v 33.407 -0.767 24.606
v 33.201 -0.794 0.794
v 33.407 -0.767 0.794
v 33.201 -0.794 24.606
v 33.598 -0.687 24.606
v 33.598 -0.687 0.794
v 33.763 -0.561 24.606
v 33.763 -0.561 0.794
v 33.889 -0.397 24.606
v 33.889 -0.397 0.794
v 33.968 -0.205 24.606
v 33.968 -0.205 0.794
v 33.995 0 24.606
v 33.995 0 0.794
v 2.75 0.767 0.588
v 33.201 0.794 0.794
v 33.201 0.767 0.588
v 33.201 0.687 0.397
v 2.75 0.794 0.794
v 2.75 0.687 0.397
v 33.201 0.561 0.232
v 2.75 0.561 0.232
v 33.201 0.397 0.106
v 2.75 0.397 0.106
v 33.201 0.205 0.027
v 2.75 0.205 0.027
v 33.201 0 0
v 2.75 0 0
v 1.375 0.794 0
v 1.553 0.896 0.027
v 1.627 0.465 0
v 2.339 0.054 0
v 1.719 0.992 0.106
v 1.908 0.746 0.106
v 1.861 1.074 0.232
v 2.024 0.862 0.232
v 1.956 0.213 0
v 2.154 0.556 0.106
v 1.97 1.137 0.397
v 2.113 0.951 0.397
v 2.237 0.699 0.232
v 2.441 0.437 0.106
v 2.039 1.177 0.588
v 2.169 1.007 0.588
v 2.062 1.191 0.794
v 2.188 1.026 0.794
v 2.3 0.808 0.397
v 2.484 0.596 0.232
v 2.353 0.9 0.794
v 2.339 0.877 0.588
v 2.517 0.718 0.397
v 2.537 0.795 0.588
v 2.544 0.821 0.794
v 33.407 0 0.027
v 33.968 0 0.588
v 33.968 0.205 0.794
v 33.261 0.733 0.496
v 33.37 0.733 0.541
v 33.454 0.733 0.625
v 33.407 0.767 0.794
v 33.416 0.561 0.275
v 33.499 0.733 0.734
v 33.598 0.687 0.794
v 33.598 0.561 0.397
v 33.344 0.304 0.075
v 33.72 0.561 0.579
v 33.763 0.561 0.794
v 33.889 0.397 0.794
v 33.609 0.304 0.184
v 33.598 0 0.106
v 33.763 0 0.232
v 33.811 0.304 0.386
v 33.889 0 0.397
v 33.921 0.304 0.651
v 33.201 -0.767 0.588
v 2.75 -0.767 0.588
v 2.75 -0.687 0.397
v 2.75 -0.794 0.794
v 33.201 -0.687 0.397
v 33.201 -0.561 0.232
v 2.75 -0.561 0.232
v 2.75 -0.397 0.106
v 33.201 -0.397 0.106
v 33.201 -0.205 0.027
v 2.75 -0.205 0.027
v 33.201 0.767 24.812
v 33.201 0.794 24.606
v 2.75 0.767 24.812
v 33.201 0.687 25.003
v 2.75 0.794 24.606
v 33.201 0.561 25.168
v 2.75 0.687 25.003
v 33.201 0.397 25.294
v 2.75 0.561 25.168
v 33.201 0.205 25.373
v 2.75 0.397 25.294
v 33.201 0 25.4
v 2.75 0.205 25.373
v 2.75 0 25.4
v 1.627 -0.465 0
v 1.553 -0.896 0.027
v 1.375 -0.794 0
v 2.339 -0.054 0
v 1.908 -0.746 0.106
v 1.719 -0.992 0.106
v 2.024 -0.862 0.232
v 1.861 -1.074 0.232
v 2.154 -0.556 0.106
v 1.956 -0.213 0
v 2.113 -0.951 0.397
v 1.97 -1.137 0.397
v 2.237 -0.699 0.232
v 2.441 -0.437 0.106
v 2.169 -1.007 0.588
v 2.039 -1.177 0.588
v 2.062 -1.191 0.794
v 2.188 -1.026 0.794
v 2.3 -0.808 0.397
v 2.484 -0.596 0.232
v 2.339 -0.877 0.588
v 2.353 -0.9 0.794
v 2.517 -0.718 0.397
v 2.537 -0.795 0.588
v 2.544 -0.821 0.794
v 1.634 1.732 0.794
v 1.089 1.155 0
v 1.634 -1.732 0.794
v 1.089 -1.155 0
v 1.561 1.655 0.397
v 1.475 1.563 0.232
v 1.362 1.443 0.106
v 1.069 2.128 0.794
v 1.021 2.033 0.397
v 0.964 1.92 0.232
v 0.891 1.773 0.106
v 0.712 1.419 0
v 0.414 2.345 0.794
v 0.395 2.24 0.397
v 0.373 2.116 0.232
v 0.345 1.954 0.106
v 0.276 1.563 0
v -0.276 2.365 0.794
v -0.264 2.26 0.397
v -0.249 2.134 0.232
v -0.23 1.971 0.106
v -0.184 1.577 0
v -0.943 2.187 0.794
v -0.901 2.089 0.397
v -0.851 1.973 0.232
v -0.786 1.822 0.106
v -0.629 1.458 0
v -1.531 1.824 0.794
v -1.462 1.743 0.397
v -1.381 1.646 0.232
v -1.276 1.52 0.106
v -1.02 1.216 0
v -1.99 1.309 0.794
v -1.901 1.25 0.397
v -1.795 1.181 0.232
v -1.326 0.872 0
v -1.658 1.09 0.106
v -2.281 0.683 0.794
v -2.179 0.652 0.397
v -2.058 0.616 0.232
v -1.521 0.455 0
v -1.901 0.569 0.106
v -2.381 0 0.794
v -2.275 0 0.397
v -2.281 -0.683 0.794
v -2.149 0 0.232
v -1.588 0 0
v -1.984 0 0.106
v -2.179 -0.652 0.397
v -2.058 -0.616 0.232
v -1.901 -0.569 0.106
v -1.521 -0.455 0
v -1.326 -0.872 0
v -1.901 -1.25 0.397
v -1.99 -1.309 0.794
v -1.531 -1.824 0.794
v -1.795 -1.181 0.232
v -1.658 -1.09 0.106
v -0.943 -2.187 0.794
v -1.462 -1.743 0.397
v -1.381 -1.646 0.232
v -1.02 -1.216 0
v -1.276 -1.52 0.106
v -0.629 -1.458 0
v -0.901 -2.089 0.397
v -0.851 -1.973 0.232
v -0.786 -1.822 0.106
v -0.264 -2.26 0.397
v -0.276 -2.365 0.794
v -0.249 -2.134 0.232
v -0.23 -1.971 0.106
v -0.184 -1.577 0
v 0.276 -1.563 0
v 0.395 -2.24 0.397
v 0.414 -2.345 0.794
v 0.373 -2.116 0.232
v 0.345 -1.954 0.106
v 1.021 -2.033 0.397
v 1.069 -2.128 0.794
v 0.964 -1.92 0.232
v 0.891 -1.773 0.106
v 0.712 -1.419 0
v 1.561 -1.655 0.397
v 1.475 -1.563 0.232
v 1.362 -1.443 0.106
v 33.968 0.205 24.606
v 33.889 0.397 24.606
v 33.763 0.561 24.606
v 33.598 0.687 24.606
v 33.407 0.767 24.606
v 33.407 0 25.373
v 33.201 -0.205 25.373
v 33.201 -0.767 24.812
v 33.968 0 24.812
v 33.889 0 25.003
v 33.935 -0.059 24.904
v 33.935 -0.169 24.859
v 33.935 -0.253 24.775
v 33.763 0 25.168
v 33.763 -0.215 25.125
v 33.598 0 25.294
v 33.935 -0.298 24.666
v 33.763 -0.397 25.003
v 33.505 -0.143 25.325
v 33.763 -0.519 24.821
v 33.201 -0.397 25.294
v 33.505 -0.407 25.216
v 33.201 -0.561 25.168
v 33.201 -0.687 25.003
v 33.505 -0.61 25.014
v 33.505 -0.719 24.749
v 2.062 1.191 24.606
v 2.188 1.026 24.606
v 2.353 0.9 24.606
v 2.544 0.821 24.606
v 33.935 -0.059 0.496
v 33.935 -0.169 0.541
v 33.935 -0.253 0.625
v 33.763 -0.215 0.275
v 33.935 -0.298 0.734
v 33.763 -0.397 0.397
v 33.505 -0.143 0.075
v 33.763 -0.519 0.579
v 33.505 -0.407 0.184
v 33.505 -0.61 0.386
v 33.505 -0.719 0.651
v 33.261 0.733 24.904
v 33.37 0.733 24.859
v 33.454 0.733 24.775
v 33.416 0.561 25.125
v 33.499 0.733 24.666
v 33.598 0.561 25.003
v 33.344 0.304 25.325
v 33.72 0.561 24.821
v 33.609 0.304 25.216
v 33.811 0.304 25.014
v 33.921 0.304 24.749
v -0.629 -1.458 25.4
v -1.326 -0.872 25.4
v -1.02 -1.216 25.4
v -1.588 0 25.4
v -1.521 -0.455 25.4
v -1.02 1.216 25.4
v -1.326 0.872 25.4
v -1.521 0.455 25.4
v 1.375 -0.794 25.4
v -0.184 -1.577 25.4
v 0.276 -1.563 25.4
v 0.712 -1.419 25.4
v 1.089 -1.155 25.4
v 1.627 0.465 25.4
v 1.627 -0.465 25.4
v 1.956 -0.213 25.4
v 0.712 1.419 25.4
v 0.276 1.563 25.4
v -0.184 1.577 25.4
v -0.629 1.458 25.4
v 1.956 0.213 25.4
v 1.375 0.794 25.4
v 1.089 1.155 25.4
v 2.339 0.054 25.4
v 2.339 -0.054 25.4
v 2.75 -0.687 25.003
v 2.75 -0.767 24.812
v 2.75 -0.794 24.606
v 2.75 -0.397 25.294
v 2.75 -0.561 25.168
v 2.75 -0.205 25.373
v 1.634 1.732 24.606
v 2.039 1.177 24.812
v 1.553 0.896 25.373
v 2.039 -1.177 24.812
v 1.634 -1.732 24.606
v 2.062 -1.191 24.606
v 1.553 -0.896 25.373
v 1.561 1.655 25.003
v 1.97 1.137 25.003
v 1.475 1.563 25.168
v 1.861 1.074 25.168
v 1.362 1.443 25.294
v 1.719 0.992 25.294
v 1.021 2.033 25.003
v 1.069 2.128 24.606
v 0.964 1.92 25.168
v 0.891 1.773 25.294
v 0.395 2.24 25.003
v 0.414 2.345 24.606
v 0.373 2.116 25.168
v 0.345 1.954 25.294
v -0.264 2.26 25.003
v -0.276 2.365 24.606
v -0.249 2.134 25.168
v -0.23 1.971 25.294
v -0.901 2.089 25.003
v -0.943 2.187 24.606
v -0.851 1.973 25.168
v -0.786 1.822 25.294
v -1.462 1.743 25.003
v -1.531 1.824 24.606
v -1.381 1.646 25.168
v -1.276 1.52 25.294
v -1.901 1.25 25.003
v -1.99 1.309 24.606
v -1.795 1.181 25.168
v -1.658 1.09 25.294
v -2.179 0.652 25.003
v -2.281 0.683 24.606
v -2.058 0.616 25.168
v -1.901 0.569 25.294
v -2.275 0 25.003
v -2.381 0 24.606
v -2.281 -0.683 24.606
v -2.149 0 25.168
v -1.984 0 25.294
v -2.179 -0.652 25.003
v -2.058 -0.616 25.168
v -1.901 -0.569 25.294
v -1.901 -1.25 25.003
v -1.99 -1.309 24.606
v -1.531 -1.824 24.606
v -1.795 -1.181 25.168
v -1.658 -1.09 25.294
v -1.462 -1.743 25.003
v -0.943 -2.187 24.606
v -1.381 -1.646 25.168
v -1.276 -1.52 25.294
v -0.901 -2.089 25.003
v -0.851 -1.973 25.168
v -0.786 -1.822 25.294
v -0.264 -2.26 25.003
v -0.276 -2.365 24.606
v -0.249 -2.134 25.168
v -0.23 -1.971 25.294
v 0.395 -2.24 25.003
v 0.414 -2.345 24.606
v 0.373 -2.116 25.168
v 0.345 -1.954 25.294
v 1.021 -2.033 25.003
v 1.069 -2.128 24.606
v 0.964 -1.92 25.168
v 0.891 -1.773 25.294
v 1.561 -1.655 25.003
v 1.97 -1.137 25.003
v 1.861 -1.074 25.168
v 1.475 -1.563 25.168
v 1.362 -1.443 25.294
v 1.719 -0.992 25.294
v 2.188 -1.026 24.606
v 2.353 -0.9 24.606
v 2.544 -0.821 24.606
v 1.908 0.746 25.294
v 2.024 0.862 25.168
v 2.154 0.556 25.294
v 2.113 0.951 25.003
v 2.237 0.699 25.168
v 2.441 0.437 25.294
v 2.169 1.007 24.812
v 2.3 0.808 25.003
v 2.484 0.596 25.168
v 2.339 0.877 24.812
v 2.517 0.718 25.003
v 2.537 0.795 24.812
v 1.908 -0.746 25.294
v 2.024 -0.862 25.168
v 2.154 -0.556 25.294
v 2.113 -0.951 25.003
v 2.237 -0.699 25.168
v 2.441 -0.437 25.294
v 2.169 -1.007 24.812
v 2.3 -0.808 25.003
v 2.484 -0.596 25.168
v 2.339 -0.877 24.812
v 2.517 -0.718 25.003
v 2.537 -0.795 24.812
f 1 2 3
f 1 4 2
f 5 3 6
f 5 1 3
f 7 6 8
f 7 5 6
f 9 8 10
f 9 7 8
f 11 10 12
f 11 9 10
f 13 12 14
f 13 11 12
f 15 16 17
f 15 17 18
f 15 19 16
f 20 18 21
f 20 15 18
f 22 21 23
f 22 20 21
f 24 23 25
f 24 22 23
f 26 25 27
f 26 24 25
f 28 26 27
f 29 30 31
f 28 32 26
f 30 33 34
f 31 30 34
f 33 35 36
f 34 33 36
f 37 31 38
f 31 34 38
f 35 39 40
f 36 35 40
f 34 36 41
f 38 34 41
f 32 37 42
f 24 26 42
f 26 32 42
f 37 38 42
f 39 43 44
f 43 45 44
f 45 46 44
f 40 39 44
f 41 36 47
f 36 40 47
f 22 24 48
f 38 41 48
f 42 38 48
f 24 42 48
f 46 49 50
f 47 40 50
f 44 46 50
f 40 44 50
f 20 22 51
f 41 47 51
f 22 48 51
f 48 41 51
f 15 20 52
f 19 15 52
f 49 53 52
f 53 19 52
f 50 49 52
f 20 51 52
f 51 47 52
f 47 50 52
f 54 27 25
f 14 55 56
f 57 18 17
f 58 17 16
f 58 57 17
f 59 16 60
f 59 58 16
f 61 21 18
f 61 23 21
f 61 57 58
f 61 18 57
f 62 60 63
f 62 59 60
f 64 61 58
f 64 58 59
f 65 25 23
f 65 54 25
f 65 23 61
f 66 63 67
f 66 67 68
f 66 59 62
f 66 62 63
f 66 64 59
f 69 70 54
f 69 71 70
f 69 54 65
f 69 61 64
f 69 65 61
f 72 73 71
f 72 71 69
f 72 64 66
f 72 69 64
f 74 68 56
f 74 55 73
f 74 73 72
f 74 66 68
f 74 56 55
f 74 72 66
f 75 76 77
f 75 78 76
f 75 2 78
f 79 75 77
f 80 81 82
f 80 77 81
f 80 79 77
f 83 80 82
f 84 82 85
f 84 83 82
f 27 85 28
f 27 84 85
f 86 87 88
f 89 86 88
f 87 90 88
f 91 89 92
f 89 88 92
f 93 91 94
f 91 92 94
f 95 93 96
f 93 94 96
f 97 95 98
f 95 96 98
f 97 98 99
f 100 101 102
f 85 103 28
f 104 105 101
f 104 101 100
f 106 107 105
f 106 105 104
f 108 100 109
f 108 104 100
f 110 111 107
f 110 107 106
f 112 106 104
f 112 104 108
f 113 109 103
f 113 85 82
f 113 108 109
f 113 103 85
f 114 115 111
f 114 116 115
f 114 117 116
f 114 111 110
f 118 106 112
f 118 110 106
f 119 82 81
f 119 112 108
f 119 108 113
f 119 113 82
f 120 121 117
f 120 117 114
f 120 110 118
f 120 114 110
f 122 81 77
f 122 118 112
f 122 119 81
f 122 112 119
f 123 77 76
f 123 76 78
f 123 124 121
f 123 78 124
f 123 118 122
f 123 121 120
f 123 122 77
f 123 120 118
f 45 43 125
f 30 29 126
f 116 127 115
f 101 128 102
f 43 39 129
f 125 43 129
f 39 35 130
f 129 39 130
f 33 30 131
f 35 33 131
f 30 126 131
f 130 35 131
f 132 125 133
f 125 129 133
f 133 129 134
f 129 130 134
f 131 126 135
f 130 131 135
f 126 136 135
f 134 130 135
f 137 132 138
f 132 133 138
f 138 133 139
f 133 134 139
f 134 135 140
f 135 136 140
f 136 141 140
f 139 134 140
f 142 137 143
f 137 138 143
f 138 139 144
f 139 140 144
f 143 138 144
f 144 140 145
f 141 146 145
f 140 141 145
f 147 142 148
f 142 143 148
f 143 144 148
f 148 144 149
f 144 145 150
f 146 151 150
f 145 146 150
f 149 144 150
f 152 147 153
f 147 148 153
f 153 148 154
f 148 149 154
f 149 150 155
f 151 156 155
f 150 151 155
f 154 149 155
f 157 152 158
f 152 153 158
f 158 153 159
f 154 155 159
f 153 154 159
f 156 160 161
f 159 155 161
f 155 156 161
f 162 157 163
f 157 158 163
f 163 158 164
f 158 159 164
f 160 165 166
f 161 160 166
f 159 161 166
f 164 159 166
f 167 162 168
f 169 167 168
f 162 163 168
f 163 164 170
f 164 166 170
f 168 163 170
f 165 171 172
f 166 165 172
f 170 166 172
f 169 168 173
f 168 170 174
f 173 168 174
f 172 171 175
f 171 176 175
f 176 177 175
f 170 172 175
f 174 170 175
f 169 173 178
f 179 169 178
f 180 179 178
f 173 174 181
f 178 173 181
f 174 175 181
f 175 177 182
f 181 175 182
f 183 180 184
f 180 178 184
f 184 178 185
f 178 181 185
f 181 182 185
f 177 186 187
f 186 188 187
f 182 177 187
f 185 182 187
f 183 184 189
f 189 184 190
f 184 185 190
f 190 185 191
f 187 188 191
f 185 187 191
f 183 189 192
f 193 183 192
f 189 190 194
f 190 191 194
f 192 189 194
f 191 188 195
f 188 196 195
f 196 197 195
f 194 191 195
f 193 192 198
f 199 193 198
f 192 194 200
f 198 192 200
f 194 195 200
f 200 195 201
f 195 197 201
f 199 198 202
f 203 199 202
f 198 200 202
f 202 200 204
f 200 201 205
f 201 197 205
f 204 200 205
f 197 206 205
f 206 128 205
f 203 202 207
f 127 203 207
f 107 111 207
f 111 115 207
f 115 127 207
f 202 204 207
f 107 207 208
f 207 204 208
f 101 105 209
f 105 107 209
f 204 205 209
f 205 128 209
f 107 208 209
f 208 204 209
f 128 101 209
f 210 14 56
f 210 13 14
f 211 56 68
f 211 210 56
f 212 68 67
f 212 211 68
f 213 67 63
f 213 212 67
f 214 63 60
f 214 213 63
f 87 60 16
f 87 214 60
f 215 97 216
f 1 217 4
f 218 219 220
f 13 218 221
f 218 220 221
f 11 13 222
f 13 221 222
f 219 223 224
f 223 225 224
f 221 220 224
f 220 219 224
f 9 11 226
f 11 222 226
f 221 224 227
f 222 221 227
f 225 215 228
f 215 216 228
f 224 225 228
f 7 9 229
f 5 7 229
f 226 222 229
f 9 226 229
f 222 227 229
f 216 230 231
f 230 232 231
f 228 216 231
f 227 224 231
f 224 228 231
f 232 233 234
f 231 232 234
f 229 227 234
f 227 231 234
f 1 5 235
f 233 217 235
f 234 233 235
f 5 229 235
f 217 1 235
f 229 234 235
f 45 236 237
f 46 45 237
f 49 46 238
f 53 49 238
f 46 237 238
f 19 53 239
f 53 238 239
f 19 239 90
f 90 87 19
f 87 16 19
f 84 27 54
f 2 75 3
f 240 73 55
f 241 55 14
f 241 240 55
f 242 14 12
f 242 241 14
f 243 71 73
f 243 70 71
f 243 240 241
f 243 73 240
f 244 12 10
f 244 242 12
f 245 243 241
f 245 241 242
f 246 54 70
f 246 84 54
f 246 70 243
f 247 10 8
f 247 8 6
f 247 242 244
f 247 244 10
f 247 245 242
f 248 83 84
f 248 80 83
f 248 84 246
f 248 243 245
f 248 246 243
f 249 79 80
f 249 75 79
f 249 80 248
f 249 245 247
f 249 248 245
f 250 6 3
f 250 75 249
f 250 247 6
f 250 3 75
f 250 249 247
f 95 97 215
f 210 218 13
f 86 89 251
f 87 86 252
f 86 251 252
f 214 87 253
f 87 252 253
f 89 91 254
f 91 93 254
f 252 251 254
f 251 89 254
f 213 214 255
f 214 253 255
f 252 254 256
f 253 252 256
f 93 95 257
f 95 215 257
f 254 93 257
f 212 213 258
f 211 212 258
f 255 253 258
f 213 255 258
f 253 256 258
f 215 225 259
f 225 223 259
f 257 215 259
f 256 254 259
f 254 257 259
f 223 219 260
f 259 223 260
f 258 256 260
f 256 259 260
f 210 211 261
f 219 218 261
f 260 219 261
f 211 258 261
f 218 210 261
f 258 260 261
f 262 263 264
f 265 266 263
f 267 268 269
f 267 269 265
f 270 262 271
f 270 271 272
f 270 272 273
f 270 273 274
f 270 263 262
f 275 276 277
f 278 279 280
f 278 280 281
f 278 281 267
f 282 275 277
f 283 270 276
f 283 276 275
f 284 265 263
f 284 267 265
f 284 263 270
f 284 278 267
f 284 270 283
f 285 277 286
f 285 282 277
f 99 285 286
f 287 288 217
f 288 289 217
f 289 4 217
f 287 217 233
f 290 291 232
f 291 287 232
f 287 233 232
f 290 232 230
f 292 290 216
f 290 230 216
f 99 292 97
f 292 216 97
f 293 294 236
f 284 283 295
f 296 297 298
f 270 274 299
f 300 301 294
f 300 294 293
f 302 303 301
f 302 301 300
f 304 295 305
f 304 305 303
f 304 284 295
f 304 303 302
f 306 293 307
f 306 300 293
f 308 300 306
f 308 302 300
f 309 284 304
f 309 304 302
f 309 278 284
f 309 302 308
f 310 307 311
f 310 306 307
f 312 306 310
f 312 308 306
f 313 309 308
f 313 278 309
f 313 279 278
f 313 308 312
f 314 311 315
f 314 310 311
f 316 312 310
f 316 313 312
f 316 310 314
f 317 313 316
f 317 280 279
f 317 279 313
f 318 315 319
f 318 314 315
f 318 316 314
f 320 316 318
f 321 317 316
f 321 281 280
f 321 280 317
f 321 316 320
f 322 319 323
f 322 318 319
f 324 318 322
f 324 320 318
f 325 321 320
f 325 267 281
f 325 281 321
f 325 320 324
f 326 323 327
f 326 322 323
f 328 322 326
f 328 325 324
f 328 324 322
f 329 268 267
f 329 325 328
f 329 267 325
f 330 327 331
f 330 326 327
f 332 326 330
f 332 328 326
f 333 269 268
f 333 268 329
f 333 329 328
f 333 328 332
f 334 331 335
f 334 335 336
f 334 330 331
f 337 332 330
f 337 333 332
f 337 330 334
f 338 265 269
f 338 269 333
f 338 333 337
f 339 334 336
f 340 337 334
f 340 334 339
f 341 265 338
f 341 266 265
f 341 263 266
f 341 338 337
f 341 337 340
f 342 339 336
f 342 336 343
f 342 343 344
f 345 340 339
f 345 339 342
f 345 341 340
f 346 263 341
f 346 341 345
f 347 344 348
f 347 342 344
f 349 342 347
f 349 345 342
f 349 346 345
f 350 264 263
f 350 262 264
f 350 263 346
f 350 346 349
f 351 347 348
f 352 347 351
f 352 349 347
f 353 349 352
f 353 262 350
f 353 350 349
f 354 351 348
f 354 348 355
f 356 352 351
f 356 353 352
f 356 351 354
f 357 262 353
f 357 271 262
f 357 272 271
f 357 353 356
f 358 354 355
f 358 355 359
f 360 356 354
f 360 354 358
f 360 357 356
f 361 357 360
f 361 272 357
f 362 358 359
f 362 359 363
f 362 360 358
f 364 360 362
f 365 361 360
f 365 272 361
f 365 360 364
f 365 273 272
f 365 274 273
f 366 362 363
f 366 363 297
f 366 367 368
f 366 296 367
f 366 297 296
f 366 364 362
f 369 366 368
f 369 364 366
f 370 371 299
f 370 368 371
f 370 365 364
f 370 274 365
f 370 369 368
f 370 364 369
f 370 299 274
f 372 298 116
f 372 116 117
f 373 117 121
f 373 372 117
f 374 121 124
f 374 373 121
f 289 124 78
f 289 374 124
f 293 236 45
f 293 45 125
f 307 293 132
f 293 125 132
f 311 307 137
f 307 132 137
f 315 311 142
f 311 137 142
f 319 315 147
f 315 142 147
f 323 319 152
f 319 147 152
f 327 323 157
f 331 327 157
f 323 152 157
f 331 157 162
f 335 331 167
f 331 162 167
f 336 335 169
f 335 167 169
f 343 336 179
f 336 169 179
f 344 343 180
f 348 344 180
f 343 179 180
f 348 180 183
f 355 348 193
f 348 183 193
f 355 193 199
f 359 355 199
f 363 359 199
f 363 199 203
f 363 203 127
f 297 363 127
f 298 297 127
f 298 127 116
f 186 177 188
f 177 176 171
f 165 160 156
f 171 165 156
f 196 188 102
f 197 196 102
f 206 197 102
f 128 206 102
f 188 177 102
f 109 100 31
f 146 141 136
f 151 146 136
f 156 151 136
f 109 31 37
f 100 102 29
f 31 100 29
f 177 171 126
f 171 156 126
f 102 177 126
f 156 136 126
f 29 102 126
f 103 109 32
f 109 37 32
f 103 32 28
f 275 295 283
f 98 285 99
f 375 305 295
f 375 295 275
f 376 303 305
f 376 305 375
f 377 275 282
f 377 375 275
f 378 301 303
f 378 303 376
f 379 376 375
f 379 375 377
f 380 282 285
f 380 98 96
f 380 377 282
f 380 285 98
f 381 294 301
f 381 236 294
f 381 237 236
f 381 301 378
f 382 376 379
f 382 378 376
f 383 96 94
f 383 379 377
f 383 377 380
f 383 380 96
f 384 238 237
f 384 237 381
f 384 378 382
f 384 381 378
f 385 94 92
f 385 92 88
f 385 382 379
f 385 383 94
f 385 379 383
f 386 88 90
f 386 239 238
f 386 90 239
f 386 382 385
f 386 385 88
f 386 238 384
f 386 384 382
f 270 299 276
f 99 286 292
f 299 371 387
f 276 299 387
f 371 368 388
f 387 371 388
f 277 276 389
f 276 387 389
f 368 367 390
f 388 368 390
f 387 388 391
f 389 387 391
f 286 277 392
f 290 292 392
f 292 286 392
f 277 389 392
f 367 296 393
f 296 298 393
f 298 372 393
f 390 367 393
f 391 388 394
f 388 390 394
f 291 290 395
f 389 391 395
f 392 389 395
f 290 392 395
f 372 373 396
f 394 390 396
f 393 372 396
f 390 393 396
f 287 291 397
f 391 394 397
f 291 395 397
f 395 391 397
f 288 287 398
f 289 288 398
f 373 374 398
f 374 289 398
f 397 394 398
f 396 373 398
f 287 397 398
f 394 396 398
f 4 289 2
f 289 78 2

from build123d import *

# Parameters (mm, degrees)
F1_DEPTH = 25.4
F2_R     = 0.79374


# Not quite as in the source:
# - a fillet or chamfer is up to 0.001 mm smaller than in the source, because OpenCascade refuses the exact size
# - a feature names something its author has since deleted; it is built from what else it names


with BuildPart() as f1:
    # F0 (on Top) → F1 (new body)
    with BuildSketch(Plane.XY):
        with BuildLine():
            ThreePointArc((2.2450640303, -0.79375), (2.3469565702, -0.4026740868), (2.38125, 0))
            ThreePointArc((2.38125, 0), (2.3469565702, 0.4026740868), (2.2450640303, 0.79375))
            ThreePointArc((2.2450640303, 0.79375), (-2.38125, 0), (2.2450640303, -0.79375))
        make_face()
        with BuildLine():
            ThreePointArc((2.2450640303, 0.79375), (2.3469565702, 0.4026740868), (2.38125, 0))
            ThreePointArc((2.38125, 0), (2.3469565702, -0.4026740868), (2.2450640303, -0.79375))
            Line((2.2450640303, -0.79375), (33.9950640303, -0.79375))
            Line((33.9950640303, -0.79375), (33.9950640303, 0))
            Line((33.9950640303, 0), (33.9950640303, 0.79375))
            Line((33.9950640303, 0.79375), (2.2450640303, 0.79375))
        make_face()
    extrude(amount=F1_DEPTH)

    # F2 (radius 0.79375 in the source; OpenCascade refuses exactly that, so slightly less here)
    f2_edges = [f1.edges().sort_by_distance(p)[0] for p in [
        (-2.38125, 0, 25.4),
        (18.120064, -0.79375, 25.4),
        (33.995064, 0, 25.4),
        (18.120064, 0.79375, 25.4),
        (-2.38125, 0, 0),
        (18.120064, -0.79375, 0),
        (33.995064, 0, 0),
        (18.120064, 0.79375, 0),
        (33.995064, 0.79375, 12.7),
        (2.245064, 0.79375, 12.7),
        (2.245064, -0.79375, 12.7),
        (33.995064, -0.79375, 12.7),
    ]]
    fillet(f2_edges, radius=F2_R)


solid = f1.part
